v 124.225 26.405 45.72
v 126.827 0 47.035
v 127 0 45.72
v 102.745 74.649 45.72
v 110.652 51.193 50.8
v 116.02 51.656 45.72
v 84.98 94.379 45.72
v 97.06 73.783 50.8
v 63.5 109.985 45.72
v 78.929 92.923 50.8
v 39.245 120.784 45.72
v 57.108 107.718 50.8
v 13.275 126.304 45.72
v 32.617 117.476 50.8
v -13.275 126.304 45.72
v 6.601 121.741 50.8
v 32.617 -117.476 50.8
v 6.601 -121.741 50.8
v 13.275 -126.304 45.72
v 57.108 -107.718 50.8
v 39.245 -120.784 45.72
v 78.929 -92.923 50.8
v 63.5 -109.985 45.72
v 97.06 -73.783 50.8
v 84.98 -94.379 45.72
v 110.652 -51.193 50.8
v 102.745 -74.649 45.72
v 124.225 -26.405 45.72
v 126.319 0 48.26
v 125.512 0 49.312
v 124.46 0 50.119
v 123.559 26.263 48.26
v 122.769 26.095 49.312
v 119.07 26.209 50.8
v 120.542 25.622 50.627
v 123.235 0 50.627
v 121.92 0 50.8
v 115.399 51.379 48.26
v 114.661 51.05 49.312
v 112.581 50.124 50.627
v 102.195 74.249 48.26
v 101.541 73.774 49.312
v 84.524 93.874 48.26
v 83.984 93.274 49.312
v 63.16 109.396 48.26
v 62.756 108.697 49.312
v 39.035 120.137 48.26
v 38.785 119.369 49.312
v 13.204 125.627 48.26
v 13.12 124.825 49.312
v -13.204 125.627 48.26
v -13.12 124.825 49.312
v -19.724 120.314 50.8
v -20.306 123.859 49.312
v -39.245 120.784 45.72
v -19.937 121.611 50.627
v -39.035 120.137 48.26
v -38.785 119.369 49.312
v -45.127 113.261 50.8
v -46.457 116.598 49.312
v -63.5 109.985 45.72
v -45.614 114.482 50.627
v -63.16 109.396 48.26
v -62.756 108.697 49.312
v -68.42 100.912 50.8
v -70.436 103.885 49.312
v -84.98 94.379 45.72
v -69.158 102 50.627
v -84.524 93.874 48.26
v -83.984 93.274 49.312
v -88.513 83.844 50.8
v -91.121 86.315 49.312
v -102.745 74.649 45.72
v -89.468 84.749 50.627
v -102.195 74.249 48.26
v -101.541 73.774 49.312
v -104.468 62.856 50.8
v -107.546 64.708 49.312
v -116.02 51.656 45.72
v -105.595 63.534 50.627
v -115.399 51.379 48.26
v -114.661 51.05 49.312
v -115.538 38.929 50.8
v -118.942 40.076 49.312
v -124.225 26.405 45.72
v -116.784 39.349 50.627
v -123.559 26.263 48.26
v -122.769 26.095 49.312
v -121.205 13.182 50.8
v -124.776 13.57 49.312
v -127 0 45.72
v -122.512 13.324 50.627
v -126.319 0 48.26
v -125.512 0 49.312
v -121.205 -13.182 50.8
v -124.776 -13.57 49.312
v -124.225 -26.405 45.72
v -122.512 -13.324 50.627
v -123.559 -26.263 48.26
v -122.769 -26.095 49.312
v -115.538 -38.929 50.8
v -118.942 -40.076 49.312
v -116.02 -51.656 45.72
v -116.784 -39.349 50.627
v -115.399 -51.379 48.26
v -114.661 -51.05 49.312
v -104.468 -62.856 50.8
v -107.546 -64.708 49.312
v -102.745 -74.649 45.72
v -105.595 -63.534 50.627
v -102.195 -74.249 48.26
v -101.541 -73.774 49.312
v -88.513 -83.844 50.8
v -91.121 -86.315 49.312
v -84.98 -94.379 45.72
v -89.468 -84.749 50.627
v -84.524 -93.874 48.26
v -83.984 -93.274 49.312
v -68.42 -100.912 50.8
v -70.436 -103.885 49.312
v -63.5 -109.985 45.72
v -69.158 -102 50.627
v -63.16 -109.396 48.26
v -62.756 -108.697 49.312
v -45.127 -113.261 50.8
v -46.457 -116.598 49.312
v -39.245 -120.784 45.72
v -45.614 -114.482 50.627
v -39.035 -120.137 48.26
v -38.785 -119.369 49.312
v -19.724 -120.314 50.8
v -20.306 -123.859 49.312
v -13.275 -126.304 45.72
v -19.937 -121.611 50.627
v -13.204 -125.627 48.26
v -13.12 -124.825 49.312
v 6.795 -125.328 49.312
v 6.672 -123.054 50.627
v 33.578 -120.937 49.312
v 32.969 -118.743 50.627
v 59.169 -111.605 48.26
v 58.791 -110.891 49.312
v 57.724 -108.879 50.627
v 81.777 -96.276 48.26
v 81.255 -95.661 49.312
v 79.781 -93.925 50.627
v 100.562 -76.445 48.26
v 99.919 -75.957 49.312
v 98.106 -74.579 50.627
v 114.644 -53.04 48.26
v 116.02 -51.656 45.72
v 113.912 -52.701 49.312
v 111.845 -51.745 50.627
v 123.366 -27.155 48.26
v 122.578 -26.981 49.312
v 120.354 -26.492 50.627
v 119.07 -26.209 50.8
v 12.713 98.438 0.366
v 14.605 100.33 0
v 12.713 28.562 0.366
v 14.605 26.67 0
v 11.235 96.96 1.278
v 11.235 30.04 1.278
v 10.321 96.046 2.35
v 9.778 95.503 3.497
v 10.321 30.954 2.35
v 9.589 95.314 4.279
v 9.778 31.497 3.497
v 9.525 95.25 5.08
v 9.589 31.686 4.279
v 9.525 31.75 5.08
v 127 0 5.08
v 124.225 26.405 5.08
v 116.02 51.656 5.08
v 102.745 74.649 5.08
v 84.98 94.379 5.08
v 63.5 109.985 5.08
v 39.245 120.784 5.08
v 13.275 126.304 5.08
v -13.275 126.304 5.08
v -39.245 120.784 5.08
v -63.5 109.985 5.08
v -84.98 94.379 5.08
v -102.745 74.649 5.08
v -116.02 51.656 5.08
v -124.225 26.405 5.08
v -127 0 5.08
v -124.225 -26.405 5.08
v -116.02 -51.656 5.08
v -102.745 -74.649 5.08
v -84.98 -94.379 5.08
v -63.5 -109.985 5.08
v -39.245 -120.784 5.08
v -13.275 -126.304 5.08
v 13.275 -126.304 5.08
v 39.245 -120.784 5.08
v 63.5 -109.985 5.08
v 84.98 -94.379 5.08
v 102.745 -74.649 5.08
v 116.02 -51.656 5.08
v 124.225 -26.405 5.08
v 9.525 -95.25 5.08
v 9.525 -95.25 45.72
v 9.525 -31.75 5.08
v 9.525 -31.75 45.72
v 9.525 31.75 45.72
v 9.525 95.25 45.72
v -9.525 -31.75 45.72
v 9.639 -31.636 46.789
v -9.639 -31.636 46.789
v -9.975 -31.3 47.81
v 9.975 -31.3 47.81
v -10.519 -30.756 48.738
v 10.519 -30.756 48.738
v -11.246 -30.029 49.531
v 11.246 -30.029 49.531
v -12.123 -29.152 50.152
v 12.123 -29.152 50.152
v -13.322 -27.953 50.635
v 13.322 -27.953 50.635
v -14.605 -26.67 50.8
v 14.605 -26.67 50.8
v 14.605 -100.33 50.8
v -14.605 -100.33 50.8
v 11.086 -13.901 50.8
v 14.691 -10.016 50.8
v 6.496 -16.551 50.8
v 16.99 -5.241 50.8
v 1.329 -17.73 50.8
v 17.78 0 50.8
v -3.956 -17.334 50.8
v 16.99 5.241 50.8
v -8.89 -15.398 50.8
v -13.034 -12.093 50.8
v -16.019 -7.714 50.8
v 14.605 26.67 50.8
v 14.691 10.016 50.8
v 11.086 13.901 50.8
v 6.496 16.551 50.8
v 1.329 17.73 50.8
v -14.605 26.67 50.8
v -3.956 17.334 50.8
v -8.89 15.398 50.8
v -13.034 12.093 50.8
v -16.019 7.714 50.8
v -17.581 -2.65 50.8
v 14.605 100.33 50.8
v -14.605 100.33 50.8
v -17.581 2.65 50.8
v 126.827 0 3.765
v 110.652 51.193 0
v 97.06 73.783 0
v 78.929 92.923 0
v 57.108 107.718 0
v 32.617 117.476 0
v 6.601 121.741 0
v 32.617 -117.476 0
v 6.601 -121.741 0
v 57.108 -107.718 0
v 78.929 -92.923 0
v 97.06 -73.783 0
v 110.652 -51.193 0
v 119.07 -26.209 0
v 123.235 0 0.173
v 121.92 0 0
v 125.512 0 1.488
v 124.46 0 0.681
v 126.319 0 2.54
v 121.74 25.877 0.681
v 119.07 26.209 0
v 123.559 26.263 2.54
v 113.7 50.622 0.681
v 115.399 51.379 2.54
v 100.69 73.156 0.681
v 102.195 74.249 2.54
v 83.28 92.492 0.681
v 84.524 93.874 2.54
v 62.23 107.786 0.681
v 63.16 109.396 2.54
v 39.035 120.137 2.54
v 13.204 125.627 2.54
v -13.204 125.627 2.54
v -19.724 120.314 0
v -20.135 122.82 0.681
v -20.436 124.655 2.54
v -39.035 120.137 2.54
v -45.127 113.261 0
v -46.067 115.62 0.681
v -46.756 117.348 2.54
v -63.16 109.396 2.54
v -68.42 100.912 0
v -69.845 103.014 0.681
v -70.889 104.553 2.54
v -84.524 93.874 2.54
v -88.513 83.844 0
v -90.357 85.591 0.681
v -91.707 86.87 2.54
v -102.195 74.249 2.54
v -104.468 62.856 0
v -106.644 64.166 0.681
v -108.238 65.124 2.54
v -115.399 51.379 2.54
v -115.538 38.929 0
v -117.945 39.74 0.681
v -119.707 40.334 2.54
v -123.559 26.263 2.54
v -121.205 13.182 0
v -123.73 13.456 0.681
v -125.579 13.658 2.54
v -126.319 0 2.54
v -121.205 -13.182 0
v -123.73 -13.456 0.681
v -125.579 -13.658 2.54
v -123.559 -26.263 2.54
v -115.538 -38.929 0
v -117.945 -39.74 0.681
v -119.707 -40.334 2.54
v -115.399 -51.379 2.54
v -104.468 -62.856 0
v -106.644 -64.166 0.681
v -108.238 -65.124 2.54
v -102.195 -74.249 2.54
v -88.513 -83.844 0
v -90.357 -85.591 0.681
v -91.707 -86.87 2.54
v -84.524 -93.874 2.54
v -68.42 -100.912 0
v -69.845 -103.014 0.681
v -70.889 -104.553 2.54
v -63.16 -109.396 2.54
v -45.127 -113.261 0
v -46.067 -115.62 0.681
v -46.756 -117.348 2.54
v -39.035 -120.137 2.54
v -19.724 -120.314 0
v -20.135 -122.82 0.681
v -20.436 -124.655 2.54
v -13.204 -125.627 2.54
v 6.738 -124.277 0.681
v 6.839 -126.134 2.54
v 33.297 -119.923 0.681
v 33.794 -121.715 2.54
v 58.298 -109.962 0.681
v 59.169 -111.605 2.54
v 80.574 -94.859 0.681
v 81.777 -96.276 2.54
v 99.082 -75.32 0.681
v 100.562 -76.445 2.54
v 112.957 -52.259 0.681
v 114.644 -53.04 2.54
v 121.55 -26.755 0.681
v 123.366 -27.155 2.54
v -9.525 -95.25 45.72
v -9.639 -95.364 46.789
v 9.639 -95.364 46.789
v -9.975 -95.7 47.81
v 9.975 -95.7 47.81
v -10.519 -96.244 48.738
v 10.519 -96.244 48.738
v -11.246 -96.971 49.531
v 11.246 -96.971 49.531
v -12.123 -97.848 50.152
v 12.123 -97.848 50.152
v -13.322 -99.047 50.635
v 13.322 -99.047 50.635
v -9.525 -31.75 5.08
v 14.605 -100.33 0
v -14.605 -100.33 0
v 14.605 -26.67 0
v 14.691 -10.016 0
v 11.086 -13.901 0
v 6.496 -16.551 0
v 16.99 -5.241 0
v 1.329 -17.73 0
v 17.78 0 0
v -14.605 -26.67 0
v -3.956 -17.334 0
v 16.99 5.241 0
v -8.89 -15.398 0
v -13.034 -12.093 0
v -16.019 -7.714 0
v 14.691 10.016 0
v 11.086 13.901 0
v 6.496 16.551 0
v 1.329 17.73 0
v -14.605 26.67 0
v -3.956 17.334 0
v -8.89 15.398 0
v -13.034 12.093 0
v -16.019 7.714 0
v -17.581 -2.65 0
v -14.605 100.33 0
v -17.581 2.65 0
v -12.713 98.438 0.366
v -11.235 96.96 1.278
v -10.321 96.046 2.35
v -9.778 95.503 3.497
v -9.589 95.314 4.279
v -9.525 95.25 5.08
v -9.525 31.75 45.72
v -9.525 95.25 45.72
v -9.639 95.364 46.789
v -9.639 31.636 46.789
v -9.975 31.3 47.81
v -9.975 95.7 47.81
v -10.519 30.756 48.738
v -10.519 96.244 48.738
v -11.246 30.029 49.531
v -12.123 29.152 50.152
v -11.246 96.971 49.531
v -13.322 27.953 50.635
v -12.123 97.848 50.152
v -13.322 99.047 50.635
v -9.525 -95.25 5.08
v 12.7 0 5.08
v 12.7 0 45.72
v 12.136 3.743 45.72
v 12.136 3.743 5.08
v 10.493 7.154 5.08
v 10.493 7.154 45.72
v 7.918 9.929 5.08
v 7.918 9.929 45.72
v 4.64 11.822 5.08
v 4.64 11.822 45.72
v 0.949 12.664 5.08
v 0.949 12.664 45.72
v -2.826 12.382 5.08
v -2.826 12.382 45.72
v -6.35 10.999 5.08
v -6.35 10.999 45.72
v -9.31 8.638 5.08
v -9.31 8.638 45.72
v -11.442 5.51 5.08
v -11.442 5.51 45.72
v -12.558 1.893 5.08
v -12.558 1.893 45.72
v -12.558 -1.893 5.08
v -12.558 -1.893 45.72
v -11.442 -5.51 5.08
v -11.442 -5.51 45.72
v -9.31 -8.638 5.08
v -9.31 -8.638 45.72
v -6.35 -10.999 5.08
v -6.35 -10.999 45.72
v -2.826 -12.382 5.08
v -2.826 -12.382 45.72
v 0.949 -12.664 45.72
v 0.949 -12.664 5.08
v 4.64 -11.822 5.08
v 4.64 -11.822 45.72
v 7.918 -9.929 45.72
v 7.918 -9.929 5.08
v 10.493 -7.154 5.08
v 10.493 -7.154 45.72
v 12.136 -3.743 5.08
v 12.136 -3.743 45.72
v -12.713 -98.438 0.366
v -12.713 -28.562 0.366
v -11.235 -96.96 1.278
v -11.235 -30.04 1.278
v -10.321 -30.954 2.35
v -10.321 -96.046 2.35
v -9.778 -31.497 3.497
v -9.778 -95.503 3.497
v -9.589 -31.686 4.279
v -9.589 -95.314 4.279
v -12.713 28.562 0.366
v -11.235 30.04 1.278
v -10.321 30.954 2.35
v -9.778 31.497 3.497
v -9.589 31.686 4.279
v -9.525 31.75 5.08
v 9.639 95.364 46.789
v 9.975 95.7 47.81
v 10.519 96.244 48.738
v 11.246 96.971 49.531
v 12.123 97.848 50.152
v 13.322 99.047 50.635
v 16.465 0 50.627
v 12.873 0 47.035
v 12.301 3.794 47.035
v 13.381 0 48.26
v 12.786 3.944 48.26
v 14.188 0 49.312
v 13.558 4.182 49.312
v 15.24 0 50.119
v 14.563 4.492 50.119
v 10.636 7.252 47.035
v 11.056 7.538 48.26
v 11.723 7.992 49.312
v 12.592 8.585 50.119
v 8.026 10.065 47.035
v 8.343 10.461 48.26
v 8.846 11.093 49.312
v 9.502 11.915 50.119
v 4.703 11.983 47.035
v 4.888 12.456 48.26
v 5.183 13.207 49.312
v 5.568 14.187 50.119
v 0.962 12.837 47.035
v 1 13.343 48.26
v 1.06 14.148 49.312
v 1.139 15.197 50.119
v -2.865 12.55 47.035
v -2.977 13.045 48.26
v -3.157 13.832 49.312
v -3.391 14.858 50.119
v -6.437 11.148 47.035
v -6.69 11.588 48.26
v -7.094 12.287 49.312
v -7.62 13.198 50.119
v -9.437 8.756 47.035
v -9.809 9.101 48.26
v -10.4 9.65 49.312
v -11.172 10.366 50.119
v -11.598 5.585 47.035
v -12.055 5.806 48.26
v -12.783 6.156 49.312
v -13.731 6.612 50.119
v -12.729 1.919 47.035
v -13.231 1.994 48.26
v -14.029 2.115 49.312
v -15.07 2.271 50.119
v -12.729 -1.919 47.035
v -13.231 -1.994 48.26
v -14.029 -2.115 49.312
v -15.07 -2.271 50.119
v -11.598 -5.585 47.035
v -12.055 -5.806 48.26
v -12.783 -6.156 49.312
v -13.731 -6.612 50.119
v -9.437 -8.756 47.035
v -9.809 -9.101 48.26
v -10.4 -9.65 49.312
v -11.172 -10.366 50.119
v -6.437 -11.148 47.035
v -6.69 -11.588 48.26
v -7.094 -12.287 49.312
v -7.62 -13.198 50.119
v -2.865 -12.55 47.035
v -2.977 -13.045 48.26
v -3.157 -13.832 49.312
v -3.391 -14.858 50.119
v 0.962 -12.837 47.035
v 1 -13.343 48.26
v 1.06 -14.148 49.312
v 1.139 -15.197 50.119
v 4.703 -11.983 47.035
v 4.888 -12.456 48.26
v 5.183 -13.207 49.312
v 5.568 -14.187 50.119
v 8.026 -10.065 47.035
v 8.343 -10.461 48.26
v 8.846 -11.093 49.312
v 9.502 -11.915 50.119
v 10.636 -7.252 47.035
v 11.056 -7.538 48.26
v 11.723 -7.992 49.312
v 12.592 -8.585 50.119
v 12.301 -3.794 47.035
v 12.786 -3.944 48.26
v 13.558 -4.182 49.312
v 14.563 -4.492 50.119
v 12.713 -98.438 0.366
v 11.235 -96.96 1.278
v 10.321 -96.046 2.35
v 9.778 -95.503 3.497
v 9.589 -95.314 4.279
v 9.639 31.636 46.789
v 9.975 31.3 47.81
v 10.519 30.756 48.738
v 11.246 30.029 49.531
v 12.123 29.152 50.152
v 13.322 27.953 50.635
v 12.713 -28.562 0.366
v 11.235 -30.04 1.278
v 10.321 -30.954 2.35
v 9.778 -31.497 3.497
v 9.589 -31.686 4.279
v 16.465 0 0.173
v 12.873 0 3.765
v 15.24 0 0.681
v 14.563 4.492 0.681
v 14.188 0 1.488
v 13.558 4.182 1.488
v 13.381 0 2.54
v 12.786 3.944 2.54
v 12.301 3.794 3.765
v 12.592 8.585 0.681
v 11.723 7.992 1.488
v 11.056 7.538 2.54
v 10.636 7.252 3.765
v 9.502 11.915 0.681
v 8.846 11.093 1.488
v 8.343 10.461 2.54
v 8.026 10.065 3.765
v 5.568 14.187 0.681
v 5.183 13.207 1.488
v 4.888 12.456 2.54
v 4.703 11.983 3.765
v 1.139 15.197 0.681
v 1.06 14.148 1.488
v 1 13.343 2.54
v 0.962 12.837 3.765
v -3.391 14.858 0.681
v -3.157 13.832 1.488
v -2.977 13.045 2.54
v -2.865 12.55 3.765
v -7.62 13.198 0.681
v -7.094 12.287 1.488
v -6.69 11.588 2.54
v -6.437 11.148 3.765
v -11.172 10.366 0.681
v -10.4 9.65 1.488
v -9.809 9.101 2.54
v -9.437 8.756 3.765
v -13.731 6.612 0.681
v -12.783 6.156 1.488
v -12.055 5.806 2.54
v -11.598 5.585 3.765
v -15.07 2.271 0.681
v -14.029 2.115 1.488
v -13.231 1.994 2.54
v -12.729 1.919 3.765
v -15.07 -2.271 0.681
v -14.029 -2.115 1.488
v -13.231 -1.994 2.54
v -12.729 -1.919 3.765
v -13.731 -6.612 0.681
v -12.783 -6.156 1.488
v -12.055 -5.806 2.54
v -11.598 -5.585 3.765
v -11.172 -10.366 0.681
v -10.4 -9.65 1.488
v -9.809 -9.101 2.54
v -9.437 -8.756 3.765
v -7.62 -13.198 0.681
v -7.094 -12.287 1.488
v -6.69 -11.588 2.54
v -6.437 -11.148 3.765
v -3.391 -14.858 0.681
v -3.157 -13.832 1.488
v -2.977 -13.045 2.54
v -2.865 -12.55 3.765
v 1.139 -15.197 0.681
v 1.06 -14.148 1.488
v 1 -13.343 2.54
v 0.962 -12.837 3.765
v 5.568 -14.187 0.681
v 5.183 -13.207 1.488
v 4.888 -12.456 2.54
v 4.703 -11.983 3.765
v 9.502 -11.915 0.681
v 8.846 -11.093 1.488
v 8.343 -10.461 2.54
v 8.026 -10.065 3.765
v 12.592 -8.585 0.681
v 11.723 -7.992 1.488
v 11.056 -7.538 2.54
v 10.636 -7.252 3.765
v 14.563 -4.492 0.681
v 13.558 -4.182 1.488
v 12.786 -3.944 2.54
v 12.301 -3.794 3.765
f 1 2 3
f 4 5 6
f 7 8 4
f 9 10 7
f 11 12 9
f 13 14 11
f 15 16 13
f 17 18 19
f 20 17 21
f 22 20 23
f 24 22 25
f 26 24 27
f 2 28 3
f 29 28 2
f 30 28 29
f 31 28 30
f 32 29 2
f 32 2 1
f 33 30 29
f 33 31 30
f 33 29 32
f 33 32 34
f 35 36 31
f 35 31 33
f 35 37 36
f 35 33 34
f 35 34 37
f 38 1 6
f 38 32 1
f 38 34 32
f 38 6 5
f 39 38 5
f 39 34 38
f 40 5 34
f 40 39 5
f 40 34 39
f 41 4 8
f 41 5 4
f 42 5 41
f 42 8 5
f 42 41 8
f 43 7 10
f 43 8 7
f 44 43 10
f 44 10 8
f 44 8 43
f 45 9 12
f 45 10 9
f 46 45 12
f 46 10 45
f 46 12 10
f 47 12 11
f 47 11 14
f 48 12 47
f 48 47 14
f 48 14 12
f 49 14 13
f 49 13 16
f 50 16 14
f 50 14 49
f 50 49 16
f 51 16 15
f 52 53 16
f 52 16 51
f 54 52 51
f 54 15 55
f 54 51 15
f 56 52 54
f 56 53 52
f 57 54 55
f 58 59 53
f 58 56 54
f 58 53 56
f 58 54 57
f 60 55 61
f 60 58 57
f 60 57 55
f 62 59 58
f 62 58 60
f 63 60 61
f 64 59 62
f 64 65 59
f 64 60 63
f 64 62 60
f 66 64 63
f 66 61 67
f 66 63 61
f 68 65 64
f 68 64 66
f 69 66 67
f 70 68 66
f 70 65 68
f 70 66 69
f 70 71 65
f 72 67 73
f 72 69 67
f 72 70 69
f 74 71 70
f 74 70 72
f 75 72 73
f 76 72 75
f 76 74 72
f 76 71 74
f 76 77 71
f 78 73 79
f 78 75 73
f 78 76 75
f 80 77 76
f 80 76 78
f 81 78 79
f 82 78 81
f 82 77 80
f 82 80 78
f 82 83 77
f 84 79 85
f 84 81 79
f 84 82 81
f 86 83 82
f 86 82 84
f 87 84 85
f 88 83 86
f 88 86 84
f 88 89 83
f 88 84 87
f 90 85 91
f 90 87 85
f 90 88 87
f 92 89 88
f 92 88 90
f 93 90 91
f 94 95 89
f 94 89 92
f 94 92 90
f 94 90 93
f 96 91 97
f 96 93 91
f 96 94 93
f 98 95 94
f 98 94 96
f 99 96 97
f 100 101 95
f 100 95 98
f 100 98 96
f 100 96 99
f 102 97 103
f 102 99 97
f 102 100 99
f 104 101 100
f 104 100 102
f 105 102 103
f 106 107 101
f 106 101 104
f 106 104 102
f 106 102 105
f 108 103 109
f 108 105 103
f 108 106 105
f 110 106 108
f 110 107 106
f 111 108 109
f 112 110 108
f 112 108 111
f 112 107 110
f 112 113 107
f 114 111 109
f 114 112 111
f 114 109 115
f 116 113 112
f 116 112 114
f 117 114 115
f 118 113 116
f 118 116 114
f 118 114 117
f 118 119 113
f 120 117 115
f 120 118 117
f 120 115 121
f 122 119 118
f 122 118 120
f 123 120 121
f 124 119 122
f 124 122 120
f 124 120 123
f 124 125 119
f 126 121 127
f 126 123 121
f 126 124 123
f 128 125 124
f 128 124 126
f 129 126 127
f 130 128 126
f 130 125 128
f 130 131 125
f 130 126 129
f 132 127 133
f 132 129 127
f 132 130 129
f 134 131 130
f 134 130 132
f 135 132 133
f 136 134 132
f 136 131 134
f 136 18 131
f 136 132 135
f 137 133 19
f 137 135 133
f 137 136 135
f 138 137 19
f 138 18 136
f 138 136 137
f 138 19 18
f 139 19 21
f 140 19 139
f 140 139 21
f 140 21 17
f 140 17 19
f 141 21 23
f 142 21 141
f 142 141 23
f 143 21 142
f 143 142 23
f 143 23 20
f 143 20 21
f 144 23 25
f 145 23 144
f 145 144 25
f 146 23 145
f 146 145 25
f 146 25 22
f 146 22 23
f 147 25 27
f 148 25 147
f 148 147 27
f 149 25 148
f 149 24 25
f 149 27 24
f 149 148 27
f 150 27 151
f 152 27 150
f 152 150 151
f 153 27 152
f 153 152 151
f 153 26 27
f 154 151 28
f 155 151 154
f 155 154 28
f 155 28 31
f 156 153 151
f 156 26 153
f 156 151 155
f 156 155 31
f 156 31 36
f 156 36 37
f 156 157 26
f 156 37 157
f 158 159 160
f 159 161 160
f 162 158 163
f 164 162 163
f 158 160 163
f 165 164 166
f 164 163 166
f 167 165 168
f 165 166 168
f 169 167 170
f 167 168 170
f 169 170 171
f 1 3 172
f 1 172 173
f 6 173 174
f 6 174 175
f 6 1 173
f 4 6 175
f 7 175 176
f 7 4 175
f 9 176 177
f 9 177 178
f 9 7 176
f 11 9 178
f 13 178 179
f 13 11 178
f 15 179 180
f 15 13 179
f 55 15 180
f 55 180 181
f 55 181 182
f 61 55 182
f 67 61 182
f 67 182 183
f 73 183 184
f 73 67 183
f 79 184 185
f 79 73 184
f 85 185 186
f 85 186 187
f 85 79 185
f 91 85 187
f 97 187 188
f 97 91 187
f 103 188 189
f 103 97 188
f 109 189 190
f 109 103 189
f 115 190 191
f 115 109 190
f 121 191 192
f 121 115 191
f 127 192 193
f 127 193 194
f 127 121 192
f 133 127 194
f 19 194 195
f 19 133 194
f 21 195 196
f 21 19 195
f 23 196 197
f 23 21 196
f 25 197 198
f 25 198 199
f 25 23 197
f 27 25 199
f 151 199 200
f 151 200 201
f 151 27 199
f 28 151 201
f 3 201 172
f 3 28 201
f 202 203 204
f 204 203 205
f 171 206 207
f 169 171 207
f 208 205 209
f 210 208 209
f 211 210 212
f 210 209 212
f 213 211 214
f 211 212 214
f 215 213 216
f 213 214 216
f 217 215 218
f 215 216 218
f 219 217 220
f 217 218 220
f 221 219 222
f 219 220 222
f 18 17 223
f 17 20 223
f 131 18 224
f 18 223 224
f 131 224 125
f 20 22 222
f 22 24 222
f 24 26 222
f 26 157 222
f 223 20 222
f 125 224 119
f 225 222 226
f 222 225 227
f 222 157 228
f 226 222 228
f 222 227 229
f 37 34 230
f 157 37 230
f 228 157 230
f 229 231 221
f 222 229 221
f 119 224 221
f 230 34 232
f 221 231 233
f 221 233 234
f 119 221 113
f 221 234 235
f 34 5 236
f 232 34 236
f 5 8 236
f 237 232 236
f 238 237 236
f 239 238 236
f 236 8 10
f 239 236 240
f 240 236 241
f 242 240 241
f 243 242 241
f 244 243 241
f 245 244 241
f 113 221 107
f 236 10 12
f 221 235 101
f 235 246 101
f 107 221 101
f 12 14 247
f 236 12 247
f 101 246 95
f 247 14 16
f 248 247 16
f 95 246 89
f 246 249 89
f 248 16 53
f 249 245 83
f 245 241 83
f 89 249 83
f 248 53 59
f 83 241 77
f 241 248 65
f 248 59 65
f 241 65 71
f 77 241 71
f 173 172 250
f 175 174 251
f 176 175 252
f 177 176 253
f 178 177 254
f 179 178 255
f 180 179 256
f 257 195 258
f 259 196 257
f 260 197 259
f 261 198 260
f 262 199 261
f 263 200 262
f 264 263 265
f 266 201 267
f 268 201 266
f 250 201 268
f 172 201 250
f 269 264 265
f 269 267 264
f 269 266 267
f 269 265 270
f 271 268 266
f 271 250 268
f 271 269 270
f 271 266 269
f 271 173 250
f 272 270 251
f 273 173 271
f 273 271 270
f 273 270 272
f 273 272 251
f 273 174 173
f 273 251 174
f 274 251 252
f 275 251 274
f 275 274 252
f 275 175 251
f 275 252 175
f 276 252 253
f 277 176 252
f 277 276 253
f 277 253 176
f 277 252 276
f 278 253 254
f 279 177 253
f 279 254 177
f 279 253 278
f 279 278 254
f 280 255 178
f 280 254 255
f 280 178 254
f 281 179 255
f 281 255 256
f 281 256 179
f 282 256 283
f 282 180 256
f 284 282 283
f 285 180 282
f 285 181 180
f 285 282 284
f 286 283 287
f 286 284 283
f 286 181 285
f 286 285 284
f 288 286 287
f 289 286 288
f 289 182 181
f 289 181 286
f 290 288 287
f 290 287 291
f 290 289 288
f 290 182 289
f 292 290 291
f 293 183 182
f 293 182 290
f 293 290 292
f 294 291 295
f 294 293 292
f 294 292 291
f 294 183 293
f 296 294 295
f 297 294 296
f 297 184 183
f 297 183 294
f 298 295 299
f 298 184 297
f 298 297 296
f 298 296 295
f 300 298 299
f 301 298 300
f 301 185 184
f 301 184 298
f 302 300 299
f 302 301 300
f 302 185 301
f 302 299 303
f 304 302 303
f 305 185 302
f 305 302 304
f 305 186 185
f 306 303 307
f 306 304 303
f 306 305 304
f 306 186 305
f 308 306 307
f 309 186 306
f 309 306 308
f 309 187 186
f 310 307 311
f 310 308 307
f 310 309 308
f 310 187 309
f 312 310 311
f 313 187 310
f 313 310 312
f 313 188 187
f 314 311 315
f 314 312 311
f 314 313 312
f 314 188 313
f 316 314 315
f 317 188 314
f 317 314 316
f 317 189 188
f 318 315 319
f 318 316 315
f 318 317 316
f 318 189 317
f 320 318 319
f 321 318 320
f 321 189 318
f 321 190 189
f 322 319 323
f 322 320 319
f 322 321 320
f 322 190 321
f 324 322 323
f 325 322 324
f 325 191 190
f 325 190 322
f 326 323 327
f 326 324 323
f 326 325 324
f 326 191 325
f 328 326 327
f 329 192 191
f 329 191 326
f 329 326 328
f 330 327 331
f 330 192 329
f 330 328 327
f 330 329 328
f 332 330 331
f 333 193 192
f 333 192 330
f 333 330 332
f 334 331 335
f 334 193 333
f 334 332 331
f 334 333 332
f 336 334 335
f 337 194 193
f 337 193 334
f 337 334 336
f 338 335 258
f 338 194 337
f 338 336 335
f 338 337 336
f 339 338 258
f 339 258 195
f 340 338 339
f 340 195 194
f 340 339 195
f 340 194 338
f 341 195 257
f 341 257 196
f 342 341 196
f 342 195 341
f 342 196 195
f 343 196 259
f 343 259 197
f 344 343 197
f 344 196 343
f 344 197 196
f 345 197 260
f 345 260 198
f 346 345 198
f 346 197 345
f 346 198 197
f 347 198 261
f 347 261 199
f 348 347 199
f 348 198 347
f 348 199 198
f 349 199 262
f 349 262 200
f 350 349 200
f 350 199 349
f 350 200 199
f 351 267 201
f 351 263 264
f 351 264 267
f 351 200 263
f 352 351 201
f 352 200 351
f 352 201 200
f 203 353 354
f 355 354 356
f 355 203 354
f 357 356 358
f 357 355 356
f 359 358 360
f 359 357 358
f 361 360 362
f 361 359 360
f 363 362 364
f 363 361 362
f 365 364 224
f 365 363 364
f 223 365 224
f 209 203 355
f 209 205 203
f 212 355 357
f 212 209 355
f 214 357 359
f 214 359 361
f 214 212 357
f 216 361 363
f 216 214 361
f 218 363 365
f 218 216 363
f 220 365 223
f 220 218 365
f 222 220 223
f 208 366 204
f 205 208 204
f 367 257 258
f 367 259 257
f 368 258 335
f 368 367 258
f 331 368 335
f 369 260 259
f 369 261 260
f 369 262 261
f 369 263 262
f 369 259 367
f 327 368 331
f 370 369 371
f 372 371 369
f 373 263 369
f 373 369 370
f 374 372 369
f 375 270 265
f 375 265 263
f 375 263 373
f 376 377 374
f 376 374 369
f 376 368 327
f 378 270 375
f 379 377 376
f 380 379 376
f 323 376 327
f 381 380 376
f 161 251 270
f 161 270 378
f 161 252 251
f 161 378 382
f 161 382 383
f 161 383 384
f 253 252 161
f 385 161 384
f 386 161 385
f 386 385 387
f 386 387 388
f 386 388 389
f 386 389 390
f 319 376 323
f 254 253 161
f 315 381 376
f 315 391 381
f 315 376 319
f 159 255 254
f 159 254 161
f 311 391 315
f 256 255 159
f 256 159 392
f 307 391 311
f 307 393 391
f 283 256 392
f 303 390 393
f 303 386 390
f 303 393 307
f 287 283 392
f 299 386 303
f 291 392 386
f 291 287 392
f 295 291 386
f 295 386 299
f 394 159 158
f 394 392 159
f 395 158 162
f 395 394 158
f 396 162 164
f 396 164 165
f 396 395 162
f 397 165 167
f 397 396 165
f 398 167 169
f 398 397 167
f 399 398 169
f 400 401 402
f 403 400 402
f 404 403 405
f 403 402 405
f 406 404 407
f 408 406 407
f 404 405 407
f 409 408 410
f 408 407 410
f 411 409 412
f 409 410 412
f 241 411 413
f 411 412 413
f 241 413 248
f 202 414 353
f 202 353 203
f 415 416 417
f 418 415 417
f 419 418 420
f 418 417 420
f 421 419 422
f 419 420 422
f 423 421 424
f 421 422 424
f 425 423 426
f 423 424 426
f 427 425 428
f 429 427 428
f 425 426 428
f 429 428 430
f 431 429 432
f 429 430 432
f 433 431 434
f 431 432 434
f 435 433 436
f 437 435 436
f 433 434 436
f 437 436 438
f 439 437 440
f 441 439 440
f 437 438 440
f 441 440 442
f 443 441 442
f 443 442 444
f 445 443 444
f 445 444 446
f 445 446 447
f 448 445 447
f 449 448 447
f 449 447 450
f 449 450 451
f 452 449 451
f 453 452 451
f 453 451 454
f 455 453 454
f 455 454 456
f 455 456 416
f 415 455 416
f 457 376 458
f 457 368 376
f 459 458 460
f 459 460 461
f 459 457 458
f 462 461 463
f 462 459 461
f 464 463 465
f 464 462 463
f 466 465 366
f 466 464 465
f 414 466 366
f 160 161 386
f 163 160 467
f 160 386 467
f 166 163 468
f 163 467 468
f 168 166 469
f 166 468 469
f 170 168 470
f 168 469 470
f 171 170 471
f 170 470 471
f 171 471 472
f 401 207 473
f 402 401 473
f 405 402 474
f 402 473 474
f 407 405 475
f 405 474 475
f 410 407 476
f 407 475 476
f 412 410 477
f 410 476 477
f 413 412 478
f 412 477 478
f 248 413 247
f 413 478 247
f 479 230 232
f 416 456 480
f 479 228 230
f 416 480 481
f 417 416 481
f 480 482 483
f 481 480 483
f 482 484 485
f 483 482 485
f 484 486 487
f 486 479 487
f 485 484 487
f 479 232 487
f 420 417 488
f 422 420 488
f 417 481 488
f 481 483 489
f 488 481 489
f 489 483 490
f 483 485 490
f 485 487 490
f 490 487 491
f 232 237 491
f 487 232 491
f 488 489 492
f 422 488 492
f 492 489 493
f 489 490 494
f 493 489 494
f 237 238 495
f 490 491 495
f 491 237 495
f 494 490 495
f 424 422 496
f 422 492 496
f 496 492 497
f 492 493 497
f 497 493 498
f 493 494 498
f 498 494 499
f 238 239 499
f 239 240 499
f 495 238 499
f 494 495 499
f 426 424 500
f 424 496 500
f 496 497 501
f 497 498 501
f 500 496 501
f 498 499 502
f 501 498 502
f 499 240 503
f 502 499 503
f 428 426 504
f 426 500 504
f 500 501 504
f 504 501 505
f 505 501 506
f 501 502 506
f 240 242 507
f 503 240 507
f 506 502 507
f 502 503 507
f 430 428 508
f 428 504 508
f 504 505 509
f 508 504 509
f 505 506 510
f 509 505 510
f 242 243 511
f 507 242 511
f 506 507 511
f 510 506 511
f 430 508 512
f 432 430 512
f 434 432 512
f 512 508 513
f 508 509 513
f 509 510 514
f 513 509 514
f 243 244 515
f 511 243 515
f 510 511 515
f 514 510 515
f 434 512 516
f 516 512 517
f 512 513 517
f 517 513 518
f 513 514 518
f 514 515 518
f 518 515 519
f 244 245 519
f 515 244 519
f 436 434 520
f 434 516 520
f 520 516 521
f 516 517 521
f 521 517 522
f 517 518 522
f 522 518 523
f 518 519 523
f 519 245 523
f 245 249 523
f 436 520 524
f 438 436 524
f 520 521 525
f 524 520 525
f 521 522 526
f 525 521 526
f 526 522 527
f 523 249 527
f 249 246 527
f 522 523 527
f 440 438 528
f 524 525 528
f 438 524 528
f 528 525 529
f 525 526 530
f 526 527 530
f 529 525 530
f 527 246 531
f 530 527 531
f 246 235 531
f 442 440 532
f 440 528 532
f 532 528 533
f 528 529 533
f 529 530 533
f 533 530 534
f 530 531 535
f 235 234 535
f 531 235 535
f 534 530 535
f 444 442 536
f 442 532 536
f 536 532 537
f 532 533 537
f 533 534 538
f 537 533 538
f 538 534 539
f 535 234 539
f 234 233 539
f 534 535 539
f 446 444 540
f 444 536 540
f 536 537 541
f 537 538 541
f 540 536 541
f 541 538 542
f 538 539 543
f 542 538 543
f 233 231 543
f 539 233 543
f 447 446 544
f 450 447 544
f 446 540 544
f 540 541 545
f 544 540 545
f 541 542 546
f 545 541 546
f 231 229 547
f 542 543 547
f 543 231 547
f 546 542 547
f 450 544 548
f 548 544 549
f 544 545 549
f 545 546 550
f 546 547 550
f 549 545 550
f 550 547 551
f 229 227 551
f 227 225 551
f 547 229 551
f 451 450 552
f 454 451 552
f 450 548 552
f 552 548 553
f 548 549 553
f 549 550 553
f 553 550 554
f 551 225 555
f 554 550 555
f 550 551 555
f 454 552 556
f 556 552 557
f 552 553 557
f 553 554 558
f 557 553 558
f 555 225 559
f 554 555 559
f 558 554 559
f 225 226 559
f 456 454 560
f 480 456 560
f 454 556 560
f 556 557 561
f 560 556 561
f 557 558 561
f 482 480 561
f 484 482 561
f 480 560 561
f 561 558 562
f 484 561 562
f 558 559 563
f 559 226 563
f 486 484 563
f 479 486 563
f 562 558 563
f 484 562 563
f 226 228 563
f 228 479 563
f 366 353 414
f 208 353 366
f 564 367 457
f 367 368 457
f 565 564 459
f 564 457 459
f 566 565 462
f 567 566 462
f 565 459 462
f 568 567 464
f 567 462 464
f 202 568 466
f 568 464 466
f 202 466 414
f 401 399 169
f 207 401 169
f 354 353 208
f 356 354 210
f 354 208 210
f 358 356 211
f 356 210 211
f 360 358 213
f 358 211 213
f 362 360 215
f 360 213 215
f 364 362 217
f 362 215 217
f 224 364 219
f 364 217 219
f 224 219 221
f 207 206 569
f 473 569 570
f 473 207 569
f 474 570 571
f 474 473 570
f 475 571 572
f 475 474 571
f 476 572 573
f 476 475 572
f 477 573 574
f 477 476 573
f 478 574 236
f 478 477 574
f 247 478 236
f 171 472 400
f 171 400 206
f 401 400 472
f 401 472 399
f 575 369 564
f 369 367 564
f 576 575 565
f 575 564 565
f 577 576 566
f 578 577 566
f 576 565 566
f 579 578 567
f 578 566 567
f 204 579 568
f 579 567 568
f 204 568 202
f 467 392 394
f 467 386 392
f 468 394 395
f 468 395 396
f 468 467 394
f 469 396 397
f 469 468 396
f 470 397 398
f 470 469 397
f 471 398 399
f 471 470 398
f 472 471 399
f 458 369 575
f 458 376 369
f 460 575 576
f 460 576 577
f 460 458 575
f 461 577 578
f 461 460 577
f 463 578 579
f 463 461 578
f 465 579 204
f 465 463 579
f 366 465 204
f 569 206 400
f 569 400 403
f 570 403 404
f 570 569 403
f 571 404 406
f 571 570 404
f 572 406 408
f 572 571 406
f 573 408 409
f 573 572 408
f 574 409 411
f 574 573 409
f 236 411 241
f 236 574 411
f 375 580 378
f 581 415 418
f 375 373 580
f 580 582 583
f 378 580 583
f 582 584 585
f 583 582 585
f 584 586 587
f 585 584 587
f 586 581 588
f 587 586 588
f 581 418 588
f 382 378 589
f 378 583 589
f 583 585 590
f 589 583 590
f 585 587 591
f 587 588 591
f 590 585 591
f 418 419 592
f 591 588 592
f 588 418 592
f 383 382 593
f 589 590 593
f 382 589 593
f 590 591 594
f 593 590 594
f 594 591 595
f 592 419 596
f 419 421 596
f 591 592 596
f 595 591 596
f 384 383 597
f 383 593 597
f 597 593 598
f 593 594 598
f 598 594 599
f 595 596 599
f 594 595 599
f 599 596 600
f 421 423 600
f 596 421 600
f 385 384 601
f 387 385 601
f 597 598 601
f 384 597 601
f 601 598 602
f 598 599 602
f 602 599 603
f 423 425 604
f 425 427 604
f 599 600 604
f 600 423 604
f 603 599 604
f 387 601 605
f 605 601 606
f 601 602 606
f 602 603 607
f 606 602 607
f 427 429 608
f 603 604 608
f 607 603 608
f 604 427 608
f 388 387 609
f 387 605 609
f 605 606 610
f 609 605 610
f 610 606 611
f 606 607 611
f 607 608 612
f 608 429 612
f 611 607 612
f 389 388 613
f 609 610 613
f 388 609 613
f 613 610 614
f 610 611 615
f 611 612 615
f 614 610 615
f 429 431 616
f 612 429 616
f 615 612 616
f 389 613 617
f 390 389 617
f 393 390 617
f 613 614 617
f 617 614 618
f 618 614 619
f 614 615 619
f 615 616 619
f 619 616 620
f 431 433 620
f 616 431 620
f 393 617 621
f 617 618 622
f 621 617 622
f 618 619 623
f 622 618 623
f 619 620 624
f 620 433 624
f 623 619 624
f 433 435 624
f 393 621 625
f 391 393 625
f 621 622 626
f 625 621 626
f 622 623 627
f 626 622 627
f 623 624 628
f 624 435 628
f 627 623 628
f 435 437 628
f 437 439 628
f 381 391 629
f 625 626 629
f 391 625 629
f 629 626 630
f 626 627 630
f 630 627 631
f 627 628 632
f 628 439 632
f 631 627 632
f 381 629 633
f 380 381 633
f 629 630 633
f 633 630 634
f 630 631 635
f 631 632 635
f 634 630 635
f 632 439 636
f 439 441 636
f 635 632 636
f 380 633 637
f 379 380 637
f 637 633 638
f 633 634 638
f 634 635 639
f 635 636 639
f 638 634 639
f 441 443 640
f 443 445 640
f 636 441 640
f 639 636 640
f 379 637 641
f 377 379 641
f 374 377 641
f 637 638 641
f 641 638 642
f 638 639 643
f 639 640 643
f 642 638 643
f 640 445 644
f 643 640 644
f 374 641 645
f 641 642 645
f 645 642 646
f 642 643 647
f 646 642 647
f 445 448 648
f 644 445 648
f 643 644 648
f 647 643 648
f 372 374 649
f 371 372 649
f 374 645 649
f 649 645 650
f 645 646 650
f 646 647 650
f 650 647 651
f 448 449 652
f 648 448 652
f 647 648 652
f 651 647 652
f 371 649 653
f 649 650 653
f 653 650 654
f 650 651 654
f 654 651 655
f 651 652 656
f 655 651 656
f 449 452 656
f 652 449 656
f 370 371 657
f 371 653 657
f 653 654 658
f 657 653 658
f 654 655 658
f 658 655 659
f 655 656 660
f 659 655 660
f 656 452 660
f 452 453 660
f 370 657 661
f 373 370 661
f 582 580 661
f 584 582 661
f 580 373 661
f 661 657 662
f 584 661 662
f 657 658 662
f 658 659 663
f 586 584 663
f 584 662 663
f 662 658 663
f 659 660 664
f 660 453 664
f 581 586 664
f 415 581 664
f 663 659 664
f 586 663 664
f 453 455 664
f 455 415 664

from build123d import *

# Parameters (mm, degrees)
F0_W     = 127
F0_H     = 50.8
F2_W     = 19.05
F2_H     = 63.5
F3_DEPTH = 50.801
F4_R     = 12.7
F5_DEPTH = 50.801
F6_R     = 5.08


with BuildPart() as f1:
    # F0 (on Front) → F1 (revolve)
    with BuildSketch(Plane.XZ):
        with Locations((63.5, 25.4)):
            Rectangle(F0_W, F0_H)
    revolve(axis=Axis((0, 0, 25.4), (0, 0, 1)))

    # F2 (on face) → F3 (cut, through all)
    with BuildSketch(Plane.XY.offset(50.8)):
        with Locations((0, 63.5)):
            Rectangle(F2_W, F2_H)
        with Locations((0, -63.5)):
            Rectangle(F2_W, F2_H)
    extrude(amount=-F3_DEPTH, mode=Mode.SUBTRACT)

    # F4 (on face) → F5 (cut, through all)
    with BuildSketch(Plane.XY.offset(50.8)):
        Circle(F4_R)
    extrude(amount=-F5_DEPTH, mode=Mode.SUBTRACT)

    # F6
    f6_edges = [f1.edges().sort_by_distance(p)[0] for p in [
        (-127, 0, 50.8),
        (9.525, -63.5, 50.8),
        (0, -95.25, 50.8),
        (-9.525, -63.5, 50.8),
        (0, -31.75, 50.8),
        (-12.7, 0, 50.8),
        (0, 95.25, 50.8),
        (9.525, 63.5, 50.8),
        (-9.525, 63.5, 50.8),
        (0, 31.75, 50.8),
        (-127, 0, 0),
        (9.525, -63.5, 0),
        (0, -95.25, 0),
        (-9.525, -63.5, 0),
        (0, -31.75, 0),
        (-12.7, 0, 0),
        (0, 31.75, 0),
        (9.525, 63.5, 0),
        (-9.525, 63.5, 0),
        (0, 95.25, 0),
    ]]
    fillet(f6_edges, radius=F6_R)


solid = f1.part
